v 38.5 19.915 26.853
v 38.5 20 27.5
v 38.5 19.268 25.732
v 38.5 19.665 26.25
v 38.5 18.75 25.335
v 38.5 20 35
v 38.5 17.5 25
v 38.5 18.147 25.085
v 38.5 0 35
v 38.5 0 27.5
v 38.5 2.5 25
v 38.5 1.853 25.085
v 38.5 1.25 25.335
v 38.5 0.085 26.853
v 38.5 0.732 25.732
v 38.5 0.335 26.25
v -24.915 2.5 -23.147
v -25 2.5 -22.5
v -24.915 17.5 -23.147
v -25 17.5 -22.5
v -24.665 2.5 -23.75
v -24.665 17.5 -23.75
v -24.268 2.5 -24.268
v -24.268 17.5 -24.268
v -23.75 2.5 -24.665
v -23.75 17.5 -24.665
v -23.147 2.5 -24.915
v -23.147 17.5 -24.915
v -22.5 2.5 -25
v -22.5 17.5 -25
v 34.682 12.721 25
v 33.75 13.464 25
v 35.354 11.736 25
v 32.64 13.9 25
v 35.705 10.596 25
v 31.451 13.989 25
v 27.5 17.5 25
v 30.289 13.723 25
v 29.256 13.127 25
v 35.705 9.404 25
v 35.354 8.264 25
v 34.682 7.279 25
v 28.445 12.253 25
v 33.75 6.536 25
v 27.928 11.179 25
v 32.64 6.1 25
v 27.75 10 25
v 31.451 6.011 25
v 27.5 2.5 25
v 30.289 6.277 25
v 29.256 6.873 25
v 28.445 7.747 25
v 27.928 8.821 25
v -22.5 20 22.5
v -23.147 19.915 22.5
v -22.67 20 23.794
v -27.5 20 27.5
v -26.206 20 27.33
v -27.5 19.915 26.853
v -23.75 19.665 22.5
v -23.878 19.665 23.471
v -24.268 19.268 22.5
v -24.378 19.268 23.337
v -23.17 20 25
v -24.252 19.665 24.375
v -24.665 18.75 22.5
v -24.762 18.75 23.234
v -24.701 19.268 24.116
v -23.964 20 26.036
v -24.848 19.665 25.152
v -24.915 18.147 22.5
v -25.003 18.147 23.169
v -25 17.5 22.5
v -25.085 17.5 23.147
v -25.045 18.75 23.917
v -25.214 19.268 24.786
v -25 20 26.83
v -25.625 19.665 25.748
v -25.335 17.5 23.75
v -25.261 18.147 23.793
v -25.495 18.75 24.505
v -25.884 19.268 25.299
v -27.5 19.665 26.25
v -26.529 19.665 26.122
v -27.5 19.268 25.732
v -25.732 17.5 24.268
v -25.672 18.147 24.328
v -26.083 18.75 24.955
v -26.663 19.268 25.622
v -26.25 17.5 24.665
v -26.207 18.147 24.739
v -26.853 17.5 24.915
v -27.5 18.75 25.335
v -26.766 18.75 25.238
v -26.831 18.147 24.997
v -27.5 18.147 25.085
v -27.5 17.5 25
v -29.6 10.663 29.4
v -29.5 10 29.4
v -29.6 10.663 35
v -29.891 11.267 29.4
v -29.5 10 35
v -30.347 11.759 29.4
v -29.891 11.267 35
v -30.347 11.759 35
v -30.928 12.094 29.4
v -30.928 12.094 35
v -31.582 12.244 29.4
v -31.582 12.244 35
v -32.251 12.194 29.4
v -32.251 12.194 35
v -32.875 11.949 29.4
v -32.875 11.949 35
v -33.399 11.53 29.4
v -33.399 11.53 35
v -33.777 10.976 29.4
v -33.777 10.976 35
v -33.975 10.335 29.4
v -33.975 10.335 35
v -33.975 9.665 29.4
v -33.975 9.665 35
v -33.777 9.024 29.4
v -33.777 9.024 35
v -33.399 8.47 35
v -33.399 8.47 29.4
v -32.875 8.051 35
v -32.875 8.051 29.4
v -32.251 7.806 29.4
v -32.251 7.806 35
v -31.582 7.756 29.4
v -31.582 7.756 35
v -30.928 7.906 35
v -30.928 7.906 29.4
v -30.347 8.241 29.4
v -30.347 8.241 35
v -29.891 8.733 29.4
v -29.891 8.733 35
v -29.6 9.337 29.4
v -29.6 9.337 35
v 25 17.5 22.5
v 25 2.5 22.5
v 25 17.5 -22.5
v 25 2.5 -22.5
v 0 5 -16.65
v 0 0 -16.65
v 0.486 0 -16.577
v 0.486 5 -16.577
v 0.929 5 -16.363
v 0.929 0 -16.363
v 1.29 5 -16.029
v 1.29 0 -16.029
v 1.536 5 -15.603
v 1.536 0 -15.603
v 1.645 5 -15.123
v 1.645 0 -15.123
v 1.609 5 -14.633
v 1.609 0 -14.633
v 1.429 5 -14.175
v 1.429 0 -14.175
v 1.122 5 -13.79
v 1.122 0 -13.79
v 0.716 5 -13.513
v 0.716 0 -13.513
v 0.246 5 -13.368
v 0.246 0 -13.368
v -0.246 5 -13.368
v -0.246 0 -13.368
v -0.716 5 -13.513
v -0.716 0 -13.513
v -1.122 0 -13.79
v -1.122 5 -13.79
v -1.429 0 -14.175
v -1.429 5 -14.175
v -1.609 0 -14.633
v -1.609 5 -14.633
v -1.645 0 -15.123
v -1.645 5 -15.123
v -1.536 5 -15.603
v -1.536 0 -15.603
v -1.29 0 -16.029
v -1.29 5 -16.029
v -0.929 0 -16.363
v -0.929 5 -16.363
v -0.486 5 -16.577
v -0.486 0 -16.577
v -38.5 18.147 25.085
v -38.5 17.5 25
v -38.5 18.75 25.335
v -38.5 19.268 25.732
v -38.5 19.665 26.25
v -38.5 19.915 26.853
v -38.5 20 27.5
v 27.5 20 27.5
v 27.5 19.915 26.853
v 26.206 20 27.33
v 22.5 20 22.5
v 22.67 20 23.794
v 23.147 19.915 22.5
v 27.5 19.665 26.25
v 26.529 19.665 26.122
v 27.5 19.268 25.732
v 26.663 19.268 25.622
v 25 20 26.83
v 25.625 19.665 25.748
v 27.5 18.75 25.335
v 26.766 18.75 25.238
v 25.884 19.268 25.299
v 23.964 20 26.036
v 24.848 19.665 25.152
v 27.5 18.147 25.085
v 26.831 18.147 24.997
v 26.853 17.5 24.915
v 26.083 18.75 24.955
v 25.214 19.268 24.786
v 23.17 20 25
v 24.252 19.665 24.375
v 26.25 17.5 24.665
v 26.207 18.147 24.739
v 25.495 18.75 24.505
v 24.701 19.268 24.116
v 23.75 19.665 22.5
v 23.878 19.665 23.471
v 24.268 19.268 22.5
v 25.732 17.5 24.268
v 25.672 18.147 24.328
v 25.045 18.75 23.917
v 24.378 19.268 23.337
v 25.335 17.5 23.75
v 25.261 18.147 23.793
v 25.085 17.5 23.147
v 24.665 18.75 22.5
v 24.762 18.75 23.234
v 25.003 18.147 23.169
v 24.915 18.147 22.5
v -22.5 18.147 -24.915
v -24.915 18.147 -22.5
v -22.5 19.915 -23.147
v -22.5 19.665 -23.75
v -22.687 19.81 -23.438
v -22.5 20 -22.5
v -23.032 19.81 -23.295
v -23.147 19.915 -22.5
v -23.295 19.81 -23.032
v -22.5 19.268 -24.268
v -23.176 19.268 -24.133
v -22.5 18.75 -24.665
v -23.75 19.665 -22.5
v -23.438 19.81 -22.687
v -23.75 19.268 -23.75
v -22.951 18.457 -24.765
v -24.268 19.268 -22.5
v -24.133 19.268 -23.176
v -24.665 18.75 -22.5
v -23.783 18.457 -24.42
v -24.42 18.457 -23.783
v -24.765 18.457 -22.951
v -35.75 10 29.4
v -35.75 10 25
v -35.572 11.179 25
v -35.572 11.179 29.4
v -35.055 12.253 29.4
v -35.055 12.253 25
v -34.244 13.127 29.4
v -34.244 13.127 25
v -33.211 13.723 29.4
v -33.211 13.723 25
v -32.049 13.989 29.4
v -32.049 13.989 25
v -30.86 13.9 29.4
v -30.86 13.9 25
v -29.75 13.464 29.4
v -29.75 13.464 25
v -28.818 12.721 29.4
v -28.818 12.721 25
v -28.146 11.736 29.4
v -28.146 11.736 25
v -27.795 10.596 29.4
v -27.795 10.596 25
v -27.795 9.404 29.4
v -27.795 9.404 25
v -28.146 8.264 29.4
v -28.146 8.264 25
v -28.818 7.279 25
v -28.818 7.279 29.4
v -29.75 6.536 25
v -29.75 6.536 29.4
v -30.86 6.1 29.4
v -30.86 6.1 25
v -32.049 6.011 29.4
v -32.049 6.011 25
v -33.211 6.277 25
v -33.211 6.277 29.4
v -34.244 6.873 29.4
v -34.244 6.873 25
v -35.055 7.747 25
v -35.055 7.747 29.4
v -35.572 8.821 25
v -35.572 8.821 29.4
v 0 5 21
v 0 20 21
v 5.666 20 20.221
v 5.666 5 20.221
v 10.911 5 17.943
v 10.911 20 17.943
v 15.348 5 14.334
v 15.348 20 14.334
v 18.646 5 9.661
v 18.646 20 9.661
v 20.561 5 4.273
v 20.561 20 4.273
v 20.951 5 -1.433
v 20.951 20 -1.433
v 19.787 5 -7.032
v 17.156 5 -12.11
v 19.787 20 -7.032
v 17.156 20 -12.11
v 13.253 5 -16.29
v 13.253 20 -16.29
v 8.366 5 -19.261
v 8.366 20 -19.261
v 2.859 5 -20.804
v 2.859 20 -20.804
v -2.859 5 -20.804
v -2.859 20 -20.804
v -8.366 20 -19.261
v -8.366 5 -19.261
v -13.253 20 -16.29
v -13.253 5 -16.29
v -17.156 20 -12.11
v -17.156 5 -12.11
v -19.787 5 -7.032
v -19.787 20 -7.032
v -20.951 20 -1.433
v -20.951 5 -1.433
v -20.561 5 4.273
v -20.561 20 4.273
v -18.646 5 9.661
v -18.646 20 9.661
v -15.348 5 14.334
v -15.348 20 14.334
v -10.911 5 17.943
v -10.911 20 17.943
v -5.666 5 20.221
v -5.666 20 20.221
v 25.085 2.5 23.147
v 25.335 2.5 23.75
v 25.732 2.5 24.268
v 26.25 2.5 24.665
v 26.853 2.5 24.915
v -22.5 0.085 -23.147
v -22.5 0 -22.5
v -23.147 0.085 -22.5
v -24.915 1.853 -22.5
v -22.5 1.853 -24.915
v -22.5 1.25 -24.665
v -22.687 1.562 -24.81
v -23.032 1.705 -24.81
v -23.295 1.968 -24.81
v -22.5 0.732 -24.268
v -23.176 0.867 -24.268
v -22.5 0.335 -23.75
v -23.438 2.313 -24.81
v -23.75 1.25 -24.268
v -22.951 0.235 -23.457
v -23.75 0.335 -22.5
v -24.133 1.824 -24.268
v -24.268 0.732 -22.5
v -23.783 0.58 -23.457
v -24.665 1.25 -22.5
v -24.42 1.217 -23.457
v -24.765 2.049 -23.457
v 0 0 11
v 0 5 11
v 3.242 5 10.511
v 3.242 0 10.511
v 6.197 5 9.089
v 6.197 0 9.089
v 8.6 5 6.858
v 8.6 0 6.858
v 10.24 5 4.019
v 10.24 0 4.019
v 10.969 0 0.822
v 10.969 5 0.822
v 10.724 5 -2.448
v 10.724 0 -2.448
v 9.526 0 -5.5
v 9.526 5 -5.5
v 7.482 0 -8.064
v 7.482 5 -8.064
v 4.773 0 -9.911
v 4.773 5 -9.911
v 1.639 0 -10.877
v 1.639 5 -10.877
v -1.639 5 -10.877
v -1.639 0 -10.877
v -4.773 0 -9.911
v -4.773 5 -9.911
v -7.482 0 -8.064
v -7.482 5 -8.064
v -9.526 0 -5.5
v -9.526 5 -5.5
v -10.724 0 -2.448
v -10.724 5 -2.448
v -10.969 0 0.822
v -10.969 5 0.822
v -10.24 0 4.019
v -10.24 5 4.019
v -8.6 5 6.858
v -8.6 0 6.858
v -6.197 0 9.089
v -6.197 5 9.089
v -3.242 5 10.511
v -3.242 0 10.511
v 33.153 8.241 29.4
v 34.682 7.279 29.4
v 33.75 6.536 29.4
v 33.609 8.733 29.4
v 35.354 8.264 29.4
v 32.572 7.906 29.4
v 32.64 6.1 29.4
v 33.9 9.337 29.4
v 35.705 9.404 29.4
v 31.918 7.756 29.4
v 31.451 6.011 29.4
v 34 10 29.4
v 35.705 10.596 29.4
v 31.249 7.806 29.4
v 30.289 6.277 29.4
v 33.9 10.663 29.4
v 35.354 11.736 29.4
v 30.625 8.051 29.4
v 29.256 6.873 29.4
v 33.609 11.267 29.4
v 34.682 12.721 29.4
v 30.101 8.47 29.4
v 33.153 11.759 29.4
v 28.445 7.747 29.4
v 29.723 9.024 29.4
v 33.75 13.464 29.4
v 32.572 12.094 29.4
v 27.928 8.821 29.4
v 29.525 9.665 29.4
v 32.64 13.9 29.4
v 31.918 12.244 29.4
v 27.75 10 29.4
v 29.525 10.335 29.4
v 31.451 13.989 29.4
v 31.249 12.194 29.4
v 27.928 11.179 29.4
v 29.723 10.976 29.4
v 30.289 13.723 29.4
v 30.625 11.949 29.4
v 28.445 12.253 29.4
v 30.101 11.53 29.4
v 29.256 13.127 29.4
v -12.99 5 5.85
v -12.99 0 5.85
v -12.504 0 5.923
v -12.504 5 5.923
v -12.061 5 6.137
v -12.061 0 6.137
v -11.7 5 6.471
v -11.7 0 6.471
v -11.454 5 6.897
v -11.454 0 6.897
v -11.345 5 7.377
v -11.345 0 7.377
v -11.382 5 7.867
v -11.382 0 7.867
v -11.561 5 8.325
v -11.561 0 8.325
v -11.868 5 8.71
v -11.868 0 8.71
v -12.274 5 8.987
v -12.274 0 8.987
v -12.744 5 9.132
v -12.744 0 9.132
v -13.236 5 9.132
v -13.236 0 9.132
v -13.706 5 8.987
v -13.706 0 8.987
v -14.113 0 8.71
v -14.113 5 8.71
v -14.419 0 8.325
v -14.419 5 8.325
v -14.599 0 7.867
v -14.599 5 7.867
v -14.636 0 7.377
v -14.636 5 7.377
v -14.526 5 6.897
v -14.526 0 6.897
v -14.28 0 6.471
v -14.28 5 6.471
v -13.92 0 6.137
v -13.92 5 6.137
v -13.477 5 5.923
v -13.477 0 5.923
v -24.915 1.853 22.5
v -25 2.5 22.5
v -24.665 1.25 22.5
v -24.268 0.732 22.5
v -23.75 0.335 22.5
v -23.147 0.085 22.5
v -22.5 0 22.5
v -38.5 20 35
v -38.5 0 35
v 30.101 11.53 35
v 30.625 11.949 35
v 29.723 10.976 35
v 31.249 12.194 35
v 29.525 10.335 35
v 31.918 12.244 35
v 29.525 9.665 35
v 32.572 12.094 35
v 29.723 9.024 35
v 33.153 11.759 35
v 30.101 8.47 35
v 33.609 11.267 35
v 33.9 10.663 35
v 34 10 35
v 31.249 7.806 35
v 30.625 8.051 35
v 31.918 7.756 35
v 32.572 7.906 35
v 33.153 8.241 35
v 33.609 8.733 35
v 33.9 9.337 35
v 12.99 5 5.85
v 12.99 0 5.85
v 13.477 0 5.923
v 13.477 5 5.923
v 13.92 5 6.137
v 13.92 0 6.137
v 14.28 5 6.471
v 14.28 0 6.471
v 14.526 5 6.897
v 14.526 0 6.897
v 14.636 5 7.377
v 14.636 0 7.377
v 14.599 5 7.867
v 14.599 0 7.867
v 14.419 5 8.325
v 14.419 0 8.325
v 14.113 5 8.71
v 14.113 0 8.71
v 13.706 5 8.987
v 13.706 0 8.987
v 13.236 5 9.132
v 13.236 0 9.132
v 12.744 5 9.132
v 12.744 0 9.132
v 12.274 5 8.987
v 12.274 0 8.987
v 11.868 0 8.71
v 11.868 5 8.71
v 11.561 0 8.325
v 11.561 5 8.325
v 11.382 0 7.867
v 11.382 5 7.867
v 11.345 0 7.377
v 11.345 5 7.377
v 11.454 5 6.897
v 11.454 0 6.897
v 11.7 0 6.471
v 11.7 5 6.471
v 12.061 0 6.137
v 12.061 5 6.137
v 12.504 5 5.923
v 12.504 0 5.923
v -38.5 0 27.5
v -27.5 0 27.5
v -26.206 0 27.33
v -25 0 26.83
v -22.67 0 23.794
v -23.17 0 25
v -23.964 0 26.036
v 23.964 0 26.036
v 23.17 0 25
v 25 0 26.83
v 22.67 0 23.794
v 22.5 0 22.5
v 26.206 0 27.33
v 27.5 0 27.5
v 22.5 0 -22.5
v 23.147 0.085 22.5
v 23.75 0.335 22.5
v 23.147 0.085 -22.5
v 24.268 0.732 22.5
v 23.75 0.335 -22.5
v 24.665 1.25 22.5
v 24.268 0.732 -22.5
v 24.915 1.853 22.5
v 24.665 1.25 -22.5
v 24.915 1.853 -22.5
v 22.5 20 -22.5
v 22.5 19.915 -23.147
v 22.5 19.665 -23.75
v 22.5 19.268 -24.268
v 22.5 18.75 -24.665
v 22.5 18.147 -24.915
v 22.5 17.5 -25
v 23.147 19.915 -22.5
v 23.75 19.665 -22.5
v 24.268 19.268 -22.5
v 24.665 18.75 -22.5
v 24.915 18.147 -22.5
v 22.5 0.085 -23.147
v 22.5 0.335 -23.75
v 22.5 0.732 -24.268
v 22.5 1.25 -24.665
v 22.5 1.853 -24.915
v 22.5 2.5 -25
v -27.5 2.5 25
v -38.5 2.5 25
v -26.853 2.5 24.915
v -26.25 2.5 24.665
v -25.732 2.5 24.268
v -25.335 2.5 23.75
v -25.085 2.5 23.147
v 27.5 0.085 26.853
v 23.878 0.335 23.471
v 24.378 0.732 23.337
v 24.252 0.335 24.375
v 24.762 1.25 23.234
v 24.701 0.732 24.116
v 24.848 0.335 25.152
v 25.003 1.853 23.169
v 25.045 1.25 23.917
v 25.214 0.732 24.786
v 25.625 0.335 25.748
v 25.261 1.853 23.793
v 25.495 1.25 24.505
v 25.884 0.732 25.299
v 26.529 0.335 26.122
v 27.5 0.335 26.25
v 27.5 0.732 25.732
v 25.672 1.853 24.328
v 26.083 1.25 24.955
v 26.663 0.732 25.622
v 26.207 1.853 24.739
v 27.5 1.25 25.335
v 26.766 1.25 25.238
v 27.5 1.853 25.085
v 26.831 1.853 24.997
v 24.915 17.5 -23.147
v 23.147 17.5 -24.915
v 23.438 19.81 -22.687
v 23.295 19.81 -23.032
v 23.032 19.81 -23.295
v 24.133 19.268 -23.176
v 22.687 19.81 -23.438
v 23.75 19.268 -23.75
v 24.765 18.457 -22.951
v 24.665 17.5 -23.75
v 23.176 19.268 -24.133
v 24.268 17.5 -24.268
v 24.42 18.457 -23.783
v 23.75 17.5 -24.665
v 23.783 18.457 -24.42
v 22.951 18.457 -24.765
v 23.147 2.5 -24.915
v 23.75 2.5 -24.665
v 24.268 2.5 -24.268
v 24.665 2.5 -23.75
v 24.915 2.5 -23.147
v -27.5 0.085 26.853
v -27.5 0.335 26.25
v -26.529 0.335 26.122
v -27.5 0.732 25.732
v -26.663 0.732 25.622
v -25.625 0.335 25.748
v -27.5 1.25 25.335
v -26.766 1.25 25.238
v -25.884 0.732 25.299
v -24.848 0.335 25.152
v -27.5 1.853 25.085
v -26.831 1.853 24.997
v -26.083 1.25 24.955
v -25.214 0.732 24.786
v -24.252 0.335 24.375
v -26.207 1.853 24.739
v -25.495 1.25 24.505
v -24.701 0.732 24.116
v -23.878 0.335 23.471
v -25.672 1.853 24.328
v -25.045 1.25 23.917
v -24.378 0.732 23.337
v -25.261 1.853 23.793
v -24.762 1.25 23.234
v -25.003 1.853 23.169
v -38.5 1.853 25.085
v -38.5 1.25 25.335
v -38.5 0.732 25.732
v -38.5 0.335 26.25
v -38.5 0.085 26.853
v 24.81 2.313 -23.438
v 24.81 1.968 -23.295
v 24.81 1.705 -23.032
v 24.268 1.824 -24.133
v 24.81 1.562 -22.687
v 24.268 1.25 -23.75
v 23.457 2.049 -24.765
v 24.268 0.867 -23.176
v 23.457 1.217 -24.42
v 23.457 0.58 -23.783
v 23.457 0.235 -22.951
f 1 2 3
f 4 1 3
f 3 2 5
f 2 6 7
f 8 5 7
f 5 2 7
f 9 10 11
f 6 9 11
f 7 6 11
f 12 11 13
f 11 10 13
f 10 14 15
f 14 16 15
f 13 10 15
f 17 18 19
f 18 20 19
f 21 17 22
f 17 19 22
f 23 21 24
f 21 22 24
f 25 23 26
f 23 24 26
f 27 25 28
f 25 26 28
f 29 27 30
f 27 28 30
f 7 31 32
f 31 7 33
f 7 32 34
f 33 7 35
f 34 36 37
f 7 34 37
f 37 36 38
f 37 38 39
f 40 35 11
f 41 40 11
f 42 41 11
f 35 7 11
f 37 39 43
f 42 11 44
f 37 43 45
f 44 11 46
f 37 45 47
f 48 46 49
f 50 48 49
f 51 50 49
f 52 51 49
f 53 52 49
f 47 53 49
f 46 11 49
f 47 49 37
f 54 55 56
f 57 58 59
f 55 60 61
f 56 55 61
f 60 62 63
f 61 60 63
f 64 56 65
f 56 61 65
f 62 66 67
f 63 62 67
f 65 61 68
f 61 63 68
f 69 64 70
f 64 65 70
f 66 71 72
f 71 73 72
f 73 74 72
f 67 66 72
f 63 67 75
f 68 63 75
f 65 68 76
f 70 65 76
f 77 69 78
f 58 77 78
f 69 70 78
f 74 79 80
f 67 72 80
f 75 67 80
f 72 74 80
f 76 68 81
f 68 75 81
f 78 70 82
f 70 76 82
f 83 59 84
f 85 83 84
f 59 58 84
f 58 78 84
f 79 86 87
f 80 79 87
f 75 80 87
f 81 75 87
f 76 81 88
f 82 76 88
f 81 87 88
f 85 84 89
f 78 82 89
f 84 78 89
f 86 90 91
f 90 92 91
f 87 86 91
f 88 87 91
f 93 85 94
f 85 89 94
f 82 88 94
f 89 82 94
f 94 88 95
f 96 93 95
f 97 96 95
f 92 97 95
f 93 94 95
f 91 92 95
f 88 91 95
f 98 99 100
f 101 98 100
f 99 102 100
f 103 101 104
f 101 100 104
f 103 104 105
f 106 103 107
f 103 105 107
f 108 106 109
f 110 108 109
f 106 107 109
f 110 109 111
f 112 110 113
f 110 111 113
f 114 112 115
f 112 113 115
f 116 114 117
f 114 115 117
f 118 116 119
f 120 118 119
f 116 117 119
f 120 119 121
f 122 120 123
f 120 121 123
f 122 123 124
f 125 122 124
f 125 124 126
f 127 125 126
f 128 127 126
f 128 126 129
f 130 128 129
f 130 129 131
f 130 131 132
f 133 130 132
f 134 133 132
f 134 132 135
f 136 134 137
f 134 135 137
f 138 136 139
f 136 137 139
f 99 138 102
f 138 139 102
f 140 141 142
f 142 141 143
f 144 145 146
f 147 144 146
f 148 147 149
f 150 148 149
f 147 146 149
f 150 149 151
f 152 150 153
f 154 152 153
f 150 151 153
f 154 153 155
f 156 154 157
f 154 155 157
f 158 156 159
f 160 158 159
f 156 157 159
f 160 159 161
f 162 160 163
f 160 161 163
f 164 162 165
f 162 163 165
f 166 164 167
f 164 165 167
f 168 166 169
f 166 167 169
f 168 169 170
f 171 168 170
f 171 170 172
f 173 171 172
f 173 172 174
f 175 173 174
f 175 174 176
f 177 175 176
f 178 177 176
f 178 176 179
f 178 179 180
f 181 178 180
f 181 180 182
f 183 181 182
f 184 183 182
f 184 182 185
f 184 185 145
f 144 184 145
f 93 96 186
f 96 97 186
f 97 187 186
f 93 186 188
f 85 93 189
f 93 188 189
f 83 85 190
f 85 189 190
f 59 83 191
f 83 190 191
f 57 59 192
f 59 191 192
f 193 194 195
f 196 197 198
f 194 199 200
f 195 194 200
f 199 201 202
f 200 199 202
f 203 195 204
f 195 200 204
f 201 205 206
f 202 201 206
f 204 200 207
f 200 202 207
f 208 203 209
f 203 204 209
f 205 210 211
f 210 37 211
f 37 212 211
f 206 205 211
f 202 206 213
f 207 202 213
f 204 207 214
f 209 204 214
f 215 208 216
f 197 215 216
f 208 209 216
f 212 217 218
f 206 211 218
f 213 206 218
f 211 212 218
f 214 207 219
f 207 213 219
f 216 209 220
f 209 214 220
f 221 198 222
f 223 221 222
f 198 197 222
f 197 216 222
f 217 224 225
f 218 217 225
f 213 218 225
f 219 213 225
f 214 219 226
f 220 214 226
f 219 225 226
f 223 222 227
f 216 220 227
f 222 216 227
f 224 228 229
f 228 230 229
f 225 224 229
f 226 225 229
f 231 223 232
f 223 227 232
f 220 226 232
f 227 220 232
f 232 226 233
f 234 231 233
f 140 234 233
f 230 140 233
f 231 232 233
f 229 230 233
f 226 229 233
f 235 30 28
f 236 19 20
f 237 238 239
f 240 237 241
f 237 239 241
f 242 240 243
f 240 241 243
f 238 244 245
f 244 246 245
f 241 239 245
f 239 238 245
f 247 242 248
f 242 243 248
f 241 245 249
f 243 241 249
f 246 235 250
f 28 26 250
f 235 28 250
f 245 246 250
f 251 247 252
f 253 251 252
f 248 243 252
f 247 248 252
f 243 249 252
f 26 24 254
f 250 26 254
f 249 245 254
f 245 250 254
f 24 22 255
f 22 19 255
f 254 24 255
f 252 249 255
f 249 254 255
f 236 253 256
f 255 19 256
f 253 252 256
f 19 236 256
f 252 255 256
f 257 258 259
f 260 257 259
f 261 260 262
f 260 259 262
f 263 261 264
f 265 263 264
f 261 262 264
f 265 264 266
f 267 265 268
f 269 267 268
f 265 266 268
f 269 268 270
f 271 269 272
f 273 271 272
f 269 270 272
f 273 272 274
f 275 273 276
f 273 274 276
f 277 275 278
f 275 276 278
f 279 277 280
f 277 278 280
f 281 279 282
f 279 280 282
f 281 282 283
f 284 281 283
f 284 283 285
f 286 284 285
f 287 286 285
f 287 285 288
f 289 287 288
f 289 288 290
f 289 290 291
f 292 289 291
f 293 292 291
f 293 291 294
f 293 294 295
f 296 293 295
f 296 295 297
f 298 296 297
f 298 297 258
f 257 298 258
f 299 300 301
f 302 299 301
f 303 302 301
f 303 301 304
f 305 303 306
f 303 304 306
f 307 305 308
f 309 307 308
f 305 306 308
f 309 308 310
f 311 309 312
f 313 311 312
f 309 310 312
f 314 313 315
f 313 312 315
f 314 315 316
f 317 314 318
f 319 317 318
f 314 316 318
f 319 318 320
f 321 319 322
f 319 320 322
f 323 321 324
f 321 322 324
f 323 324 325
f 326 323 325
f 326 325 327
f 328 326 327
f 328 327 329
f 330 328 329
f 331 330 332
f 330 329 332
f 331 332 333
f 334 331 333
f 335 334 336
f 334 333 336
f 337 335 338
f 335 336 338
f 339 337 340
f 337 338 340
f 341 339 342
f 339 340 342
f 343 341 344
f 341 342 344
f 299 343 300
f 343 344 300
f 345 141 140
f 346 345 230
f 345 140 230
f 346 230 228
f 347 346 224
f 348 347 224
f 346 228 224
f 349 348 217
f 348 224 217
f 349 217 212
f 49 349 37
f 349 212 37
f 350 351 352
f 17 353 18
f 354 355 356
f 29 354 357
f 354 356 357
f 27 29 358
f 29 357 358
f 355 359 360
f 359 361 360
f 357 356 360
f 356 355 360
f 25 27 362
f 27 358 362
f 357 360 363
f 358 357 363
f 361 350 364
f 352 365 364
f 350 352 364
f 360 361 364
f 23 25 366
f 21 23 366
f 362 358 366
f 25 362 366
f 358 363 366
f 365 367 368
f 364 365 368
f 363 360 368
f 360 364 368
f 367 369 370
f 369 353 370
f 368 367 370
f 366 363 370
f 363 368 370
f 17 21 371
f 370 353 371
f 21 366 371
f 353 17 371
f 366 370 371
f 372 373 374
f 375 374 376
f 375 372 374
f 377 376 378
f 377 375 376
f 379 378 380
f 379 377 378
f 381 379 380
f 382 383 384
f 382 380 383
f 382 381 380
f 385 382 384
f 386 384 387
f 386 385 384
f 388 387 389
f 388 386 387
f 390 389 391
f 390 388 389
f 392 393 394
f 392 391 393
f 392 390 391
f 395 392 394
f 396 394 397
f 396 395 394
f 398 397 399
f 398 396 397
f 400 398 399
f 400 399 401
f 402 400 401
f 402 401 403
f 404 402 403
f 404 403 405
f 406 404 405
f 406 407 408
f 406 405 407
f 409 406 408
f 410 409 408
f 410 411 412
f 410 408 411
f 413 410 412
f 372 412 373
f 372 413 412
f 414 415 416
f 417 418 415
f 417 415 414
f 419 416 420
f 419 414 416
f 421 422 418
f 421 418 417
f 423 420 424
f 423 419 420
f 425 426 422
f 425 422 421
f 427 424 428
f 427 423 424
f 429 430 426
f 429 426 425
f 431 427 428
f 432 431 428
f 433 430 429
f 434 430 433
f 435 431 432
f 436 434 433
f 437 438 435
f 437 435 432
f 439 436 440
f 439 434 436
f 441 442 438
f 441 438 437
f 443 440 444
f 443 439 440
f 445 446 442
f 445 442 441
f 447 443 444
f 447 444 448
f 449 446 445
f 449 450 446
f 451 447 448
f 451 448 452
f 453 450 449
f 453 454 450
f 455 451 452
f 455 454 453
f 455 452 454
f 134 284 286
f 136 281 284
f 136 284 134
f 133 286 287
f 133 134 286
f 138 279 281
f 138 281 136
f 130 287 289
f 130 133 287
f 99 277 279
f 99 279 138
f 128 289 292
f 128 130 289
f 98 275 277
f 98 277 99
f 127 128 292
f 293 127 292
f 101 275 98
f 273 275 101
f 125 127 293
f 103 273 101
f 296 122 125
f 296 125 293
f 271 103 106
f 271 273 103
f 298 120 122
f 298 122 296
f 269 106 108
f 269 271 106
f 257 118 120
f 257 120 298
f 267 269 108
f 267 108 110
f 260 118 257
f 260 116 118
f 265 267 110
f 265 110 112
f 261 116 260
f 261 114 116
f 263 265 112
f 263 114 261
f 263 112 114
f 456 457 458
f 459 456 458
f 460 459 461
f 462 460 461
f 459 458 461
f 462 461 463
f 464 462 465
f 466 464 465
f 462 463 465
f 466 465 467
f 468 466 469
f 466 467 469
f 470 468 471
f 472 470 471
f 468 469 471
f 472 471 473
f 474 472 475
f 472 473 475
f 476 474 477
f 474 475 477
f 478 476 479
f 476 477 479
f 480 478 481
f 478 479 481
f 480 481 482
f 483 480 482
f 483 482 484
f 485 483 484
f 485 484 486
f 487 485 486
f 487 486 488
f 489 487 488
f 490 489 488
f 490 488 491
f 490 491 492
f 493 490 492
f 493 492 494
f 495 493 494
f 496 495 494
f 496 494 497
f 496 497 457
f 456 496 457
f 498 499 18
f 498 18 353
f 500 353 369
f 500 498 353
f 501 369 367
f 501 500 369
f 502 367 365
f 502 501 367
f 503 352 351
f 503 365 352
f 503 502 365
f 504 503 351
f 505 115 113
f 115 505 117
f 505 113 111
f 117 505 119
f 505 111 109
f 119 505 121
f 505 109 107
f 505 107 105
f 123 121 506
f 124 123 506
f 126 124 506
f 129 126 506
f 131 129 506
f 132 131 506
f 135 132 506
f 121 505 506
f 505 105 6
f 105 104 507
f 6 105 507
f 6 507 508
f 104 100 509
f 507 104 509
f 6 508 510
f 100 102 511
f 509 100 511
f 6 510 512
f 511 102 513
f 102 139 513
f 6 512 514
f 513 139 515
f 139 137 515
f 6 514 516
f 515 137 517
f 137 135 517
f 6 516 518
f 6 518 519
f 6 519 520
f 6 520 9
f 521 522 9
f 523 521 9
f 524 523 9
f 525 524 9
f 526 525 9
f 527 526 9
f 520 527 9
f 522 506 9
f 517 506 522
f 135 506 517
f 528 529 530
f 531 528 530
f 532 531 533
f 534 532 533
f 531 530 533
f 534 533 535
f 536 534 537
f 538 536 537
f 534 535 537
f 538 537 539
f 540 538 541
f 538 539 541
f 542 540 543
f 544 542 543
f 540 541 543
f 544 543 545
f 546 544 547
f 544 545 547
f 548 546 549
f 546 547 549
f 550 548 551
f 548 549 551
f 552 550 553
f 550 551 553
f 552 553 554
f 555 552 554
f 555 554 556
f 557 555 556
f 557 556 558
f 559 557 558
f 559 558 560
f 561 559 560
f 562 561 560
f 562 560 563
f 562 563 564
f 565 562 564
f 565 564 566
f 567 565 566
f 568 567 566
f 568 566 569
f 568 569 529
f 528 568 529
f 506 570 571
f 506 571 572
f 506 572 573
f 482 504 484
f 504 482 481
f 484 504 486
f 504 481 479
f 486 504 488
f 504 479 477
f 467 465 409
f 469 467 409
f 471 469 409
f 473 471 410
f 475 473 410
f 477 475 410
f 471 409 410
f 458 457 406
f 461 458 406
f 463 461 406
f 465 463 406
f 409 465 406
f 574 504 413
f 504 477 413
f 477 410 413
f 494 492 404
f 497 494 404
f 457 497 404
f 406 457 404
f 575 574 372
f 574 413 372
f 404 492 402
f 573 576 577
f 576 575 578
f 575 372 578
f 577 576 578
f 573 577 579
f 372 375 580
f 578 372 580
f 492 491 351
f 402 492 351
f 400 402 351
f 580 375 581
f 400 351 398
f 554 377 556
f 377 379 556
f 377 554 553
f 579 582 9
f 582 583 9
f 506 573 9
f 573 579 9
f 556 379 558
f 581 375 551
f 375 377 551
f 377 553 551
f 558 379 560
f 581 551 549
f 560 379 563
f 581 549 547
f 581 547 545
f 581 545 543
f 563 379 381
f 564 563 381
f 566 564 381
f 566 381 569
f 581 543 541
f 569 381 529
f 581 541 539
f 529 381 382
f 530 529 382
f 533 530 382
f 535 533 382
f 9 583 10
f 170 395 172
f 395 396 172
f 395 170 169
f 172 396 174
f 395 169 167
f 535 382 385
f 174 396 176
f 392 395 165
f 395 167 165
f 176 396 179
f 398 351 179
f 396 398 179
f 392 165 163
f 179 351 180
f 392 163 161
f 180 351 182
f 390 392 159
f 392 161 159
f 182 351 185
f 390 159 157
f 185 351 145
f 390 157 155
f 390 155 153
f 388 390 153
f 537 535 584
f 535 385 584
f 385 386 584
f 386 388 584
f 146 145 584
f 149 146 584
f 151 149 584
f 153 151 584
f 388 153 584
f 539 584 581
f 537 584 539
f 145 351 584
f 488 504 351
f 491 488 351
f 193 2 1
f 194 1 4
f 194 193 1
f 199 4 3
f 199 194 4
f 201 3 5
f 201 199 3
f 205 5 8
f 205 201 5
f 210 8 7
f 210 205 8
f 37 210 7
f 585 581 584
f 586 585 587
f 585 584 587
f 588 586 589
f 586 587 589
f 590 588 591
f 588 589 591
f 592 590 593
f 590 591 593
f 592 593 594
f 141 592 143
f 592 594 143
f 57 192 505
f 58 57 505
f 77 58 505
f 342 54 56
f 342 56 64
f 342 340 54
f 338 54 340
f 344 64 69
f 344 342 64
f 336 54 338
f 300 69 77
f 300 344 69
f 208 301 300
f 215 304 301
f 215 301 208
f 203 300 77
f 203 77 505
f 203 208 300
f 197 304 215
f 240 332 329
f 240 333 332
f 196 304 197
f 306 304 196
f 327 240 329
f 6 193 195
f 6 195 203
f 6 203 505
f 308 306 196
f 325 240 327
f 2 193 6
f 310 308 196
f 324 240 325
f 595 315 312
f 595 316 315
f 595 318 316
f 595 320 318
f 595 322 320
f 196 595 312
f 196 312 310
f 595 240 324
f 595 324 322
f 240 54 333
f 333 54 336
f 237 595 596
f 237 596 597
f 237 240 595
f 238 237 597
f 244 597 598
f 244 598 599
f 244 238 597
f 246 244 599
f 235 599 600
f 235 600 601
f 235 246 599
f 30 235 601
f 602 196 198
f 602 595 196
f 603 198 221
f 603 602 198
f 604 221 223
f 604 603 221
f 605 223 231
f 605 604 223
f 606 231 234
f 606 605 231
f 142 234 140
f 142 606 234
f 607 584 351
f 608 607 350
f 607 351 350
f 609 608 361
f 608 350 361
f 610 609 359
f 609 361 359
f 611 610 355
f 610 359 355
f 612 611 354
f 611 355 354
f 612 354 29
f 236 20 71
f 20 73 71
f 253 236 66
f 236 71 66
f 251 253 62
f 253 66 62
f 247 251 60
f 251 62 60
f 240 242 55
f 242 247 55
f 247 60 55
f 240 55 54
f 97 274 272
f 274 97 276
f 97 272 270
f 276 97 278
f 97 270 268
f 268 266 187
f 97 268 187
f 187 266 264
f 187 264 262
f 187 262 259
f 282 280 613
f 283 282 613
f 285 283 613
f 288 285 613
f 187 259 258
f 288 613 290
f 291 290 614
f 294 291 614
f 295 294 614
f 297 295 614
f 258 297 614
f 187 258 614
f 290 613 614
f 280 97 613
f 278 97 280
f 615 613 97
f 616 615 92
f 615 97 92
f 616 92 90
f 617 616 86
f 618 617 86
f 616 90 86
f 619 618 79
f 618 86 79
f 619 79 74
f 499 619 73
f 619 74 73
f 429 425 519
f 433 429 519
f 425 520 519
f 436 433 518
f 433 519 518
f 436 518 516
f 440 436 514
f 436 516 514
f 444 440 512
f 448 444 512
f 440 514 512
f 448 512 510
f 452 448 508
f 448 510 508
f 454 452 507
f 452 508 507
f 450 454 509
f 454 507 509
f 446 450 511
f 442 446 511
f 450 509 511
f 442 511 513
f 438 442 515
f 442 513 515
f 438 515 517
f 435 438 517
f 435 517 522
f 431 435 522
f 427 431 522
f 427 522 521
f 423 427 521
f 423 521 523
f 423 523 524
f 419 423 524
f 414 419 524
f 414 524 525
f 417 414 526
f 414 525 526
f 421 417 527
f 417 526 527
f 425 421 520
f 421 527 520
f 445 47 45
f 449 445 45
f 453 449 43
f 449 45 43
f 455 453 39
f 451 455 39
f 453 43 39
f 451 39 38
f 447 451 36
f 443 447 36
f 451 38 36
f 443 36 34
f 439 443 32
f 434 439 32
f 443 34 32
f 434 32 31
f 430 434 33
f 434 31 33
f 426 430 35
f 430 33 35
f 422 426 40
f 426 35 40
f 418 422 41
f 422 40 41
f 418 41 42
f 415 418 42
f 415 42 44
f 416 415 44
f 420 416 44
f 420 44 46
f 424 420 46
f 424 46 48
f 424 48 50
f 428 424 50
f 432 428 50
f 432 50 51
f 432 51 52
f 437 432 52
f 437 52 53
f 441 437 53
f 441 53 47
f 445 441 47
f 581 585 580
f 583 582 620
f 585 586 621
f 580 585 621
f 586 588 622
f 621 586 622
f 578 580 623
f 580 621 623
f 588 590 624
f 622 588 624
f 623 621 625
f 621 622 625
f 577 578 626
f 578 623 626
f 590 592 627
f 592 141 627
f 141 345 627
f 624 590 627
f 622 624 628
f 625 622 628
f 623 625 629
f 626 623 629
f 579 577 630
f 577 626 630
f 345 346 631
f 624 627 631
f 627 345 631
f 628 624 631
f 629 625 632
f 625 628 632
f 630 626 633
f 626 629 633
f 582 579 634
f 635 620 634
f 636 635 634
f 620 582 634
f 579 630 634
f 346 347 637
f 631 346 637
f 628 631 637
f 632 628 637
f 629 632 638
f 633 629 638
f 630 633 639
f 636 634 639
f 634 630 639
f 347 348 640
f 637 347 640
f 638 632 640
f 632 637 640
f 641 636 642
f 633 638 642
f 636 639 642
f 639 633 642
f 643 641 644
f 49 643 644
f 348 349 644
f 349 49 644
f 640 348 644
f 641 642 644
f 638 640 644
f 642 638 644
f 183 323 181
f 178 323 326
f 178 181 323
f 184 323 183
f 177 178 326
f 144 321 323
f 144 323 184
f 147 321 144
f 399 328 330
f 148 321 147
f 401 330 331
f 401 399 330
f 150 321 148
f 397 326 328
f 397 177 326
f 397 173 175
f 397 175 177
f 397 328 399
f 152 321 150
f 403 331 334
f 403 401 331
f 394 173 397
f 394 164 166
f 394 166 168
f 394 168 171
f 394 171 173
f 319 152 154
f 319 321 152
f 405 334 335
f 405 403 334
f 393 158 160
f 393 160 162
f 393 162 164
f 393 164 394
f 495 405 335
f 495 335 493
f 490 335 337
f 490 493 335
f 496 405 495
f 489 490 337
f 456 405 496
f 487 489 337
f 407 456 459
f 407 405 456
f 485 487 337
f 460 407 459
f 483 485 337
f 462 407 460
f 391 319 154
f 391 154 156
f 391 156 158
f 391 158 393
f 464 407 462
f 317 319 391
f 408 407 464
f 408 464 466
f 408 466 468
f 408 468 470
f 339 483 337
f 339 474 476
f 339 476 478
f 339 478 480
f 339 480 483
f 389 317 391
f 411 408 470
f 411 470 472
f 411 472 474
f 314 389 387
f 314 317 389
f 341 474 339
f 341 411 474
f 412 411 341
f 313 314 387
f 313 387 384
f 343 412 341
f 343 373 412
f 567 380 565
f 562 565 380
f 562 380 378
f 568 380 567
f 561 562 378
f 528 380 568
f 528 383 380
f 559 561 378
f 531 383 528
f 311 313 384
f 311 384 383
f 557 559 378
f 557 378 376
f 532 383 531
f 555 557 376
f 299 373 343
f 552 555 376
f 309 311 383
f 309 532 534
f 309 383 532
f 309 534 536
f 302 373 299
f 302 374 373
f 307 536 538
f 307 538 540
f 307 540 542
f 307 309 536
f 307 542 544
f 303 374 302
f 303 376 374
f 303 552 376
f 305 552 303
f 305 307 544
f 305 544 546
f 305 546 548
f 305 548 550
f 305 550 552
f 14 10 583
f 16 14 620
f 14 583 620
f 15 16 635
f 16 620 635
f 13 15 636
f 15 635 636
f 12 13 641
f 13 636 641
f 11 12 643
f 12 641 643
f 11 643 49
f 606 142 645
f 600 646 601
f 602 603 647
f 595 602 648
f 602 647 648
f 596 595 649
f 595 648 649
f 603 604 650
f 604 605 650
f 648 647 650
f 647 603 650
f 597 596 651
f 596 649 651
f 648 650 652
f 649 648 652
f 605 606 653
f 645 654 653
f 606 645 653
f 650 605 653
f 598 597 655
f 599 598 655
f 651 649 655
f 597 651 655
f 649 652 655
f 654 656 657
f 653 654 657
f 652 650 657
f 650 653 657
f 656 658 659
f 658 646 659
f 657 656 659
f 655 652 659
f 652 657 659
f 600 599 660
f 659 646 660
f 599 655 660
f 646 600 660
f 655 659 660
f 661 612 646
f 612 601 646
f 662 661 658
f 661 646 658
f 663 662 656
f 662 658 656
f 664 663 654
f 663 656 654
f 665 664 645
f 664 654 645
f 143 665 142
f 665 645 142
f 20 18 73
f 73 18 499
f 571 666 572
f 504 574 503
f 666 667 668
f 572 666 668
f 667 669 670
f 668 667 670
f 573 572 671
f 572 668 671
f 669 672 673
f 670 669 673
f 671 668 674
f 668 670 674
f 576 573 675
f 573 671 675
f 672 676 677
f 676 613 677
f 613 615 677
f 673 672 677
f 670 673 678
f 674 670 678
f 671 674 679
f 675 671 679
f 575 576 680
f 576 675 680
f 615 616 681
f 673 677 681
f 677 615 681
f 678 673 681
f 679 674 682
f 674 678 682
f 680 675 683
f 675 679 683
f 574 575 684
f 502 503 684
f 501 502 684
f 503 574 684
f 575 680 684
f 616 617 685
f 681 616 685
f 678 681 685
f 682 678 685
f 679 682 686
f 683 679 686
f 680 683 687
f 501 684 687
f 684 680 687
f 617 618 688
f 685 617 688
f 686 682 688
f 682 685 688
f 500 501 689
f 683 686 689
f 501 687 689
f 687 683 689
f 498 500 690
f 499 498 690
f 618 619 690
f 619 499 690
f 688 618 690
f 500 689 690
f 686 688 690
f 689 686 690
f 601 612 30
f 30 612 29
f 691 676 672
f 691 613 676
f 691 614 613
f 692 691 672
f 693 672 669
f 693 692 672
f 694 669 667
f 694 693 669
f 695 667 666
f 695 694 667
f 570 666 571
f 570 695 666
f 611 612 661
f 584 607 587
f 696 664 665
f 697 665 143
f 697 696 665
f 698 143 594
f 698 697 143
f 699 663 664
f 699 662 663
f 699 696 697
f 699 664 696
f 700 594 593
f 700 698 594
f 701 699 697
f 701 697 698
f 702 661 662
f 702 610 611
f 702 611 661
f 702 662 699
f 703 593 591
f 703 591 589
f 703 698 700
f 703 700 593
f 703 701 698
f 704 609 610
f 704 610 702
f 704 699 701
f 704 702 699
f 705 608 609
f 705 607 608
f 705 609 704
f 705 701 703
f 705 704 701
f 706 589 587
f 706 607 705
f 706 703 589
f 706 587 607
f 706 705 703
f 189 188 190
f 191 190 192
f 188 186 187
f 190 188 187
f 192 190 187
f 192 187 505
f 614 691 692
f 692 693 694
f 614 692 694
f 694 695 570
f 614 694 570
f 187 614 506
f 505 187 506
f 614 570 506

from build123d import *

# Parameters (mm, degrees)
SKETCH1_R                                           = 11
BOSS_EXTRUDE1_DEPTH                                 = 20
SKETCH2_R                                           = 21
CUT_EXTRUDE1_DEPTH                                  = 15
CBORE_FOR_M4_HEX_SOCKET_HEAD_CAP_SCREW2_D           = 4.5
CBORE_FOR_M4_HEX_SOCKET_HEAD_CAP_SCREW2_CBORE_D     = 8
CBORE_FOR_M4_HEX_SOCKET_HEAD_CAP_SCREW2_CBORE_DEPTH = 4.4
CUT_EXTRUDE2_REACH                                  = 57.743
SKETCH5_R                                           = 1.65
FILLET1_R                                           = 2.5


with BuildPart() as part:
    # Sketch1 → Boss-Extrude1 (new body)
    with BuildSketch(Plane(origin=(0, 0, 0), x_dir=(1, 0, 0), z_dir=(0, 1, 0))):
        Polygon((-25, -25), (-38.5, -25), (-38.5, -35), (38.5, -35), (38.5, -25), (25, -25), (25, 25), (-25, 25), align=None)
        with Locations(Location((0, 0, 0), (0, 0, 270))):
            Circle(SKETCH1_R, mode=Mode.SUBTRACT)
    extrude(amount=BOSS_EXTRUDE1_DEPTH)

    # Sketch2 → Cut-Extrude1 (cut)
    with BuildSketch(Plane(origin=(0, 20, 0), x_dir=(1, 0, 0), z_dir=(0, 1, 0))):
        with Locations(Location((0, 0, 0), (0, 0, 270))):
            Circle(SKETCH2_R)
    extrude(amount=-CUT_EXTRUDE1_DEPTH, mode=Mode.SUBTRACT)

    # CBORE for M4 Hex Socket Head Cap Screw2 (through all)
    with Locations(Plane(origin=(31.75, 10, 25), x_dir=(-1, 0, 0), z_dir=(0, 0, -1))):
        with Locations((0, 0), (63.5, 0)):
            CounterBoreHole(CBORE_FOR_M4_HEX_SOCKET_HEAD_CAP_SCREW2_D / 2, CBORE_FOR_M4_HEX_SOCKET_HEAD_CAP_SCREW2_CBORE_D / 2, CBORE_FOR_M4_HEX_SOCKET_HEAD_CAP_SCREW2_CBORE_DEPTH)

    # Sketch5 → Cut-Extrude2 (cut, up to next)
    with BuildSketch(Plane.XZ, mode=Mode.PRIVATE) as cut_extrude2_sk1:
        with Locations(Location((12.990381057, 7.5, 0), (0, 0, 270))):
            Circle(SKETCH5_R)
    cut_extrude2_tool1 = extrude(cut_extrude2_sk1.sketch, amount=-CUT_EXTRUDE2_REACH, mode=Mode.PRIVATE) & part.part
    # Sketch5 → Cut-Extrude2 (cut, up to next)
    with BuildSketch(Plane.XZ, mode=Mode.PRIVATE) as cut_extrude2_sk2:
        with Locations(Location((-12.990381057, 7.5, 0), (0, 0, 270))):
            Circle(SKETCH5_R)
    cut_extrude2_tool2 = extrude(cut_extrude2_sk2.sketch, amount=-CUT_EXTRUDE2_REACH, mode=Mode.PRIVATE) & part.part
    # Sketch5 → Cut-Extrude2 (cut, up to next)
    with BuildSketch(Plane.XZ, mode=Mode.PRIVATE) as cut_extrude2_sk3:
        with Locations(Location((0, -15, 0), (0, 0, 270))):
            Circle(SKETCH5_R)
    cut_extrude2_tool3 = extrude(cut_extrude2_sk3.sketch, amount=-CUT_EXTRUDE2_REACH, mode=Mode.PRIVATE) & part.part
    add(cut_extrude2_tool1.solids().sort_by_distance((12.990381, 0, 7.5))[0], mode=Mode.SUBTRACT)
    add(cut_extrude2_tool2.solids().sort_by_distance((-12.990381, 0, 7.5))[0], mode=Mode.SUBTRACT)
    add(cut_extrude2_tool3.solids().sort_by_distance((0, 0, -15))[0], mode=Mode.SUBTRACT)

    # Fillet1
    fillet1_edges = [part.edges().sort_by_distance(p)[0] for p in [
        (-31.75, 0, 25),
        (-25, 0, 0),
        (0, 0, -25),
        (-31.75, 20, 25),
        (25, 10, -25),
        (25, 10, 25),
        (-25, 10, 25),
        (-25, 10, -25),
        (31.75, 20, 25),
        (25, 20, 0),
        (0, 20, -25),
        (25, 0, 0),
        (-25, 20, 0),
        (31.75, 0, 25),
    ]]
    fillet(fillet1_edges, radius=FILLET1_R)


solid = part.part
